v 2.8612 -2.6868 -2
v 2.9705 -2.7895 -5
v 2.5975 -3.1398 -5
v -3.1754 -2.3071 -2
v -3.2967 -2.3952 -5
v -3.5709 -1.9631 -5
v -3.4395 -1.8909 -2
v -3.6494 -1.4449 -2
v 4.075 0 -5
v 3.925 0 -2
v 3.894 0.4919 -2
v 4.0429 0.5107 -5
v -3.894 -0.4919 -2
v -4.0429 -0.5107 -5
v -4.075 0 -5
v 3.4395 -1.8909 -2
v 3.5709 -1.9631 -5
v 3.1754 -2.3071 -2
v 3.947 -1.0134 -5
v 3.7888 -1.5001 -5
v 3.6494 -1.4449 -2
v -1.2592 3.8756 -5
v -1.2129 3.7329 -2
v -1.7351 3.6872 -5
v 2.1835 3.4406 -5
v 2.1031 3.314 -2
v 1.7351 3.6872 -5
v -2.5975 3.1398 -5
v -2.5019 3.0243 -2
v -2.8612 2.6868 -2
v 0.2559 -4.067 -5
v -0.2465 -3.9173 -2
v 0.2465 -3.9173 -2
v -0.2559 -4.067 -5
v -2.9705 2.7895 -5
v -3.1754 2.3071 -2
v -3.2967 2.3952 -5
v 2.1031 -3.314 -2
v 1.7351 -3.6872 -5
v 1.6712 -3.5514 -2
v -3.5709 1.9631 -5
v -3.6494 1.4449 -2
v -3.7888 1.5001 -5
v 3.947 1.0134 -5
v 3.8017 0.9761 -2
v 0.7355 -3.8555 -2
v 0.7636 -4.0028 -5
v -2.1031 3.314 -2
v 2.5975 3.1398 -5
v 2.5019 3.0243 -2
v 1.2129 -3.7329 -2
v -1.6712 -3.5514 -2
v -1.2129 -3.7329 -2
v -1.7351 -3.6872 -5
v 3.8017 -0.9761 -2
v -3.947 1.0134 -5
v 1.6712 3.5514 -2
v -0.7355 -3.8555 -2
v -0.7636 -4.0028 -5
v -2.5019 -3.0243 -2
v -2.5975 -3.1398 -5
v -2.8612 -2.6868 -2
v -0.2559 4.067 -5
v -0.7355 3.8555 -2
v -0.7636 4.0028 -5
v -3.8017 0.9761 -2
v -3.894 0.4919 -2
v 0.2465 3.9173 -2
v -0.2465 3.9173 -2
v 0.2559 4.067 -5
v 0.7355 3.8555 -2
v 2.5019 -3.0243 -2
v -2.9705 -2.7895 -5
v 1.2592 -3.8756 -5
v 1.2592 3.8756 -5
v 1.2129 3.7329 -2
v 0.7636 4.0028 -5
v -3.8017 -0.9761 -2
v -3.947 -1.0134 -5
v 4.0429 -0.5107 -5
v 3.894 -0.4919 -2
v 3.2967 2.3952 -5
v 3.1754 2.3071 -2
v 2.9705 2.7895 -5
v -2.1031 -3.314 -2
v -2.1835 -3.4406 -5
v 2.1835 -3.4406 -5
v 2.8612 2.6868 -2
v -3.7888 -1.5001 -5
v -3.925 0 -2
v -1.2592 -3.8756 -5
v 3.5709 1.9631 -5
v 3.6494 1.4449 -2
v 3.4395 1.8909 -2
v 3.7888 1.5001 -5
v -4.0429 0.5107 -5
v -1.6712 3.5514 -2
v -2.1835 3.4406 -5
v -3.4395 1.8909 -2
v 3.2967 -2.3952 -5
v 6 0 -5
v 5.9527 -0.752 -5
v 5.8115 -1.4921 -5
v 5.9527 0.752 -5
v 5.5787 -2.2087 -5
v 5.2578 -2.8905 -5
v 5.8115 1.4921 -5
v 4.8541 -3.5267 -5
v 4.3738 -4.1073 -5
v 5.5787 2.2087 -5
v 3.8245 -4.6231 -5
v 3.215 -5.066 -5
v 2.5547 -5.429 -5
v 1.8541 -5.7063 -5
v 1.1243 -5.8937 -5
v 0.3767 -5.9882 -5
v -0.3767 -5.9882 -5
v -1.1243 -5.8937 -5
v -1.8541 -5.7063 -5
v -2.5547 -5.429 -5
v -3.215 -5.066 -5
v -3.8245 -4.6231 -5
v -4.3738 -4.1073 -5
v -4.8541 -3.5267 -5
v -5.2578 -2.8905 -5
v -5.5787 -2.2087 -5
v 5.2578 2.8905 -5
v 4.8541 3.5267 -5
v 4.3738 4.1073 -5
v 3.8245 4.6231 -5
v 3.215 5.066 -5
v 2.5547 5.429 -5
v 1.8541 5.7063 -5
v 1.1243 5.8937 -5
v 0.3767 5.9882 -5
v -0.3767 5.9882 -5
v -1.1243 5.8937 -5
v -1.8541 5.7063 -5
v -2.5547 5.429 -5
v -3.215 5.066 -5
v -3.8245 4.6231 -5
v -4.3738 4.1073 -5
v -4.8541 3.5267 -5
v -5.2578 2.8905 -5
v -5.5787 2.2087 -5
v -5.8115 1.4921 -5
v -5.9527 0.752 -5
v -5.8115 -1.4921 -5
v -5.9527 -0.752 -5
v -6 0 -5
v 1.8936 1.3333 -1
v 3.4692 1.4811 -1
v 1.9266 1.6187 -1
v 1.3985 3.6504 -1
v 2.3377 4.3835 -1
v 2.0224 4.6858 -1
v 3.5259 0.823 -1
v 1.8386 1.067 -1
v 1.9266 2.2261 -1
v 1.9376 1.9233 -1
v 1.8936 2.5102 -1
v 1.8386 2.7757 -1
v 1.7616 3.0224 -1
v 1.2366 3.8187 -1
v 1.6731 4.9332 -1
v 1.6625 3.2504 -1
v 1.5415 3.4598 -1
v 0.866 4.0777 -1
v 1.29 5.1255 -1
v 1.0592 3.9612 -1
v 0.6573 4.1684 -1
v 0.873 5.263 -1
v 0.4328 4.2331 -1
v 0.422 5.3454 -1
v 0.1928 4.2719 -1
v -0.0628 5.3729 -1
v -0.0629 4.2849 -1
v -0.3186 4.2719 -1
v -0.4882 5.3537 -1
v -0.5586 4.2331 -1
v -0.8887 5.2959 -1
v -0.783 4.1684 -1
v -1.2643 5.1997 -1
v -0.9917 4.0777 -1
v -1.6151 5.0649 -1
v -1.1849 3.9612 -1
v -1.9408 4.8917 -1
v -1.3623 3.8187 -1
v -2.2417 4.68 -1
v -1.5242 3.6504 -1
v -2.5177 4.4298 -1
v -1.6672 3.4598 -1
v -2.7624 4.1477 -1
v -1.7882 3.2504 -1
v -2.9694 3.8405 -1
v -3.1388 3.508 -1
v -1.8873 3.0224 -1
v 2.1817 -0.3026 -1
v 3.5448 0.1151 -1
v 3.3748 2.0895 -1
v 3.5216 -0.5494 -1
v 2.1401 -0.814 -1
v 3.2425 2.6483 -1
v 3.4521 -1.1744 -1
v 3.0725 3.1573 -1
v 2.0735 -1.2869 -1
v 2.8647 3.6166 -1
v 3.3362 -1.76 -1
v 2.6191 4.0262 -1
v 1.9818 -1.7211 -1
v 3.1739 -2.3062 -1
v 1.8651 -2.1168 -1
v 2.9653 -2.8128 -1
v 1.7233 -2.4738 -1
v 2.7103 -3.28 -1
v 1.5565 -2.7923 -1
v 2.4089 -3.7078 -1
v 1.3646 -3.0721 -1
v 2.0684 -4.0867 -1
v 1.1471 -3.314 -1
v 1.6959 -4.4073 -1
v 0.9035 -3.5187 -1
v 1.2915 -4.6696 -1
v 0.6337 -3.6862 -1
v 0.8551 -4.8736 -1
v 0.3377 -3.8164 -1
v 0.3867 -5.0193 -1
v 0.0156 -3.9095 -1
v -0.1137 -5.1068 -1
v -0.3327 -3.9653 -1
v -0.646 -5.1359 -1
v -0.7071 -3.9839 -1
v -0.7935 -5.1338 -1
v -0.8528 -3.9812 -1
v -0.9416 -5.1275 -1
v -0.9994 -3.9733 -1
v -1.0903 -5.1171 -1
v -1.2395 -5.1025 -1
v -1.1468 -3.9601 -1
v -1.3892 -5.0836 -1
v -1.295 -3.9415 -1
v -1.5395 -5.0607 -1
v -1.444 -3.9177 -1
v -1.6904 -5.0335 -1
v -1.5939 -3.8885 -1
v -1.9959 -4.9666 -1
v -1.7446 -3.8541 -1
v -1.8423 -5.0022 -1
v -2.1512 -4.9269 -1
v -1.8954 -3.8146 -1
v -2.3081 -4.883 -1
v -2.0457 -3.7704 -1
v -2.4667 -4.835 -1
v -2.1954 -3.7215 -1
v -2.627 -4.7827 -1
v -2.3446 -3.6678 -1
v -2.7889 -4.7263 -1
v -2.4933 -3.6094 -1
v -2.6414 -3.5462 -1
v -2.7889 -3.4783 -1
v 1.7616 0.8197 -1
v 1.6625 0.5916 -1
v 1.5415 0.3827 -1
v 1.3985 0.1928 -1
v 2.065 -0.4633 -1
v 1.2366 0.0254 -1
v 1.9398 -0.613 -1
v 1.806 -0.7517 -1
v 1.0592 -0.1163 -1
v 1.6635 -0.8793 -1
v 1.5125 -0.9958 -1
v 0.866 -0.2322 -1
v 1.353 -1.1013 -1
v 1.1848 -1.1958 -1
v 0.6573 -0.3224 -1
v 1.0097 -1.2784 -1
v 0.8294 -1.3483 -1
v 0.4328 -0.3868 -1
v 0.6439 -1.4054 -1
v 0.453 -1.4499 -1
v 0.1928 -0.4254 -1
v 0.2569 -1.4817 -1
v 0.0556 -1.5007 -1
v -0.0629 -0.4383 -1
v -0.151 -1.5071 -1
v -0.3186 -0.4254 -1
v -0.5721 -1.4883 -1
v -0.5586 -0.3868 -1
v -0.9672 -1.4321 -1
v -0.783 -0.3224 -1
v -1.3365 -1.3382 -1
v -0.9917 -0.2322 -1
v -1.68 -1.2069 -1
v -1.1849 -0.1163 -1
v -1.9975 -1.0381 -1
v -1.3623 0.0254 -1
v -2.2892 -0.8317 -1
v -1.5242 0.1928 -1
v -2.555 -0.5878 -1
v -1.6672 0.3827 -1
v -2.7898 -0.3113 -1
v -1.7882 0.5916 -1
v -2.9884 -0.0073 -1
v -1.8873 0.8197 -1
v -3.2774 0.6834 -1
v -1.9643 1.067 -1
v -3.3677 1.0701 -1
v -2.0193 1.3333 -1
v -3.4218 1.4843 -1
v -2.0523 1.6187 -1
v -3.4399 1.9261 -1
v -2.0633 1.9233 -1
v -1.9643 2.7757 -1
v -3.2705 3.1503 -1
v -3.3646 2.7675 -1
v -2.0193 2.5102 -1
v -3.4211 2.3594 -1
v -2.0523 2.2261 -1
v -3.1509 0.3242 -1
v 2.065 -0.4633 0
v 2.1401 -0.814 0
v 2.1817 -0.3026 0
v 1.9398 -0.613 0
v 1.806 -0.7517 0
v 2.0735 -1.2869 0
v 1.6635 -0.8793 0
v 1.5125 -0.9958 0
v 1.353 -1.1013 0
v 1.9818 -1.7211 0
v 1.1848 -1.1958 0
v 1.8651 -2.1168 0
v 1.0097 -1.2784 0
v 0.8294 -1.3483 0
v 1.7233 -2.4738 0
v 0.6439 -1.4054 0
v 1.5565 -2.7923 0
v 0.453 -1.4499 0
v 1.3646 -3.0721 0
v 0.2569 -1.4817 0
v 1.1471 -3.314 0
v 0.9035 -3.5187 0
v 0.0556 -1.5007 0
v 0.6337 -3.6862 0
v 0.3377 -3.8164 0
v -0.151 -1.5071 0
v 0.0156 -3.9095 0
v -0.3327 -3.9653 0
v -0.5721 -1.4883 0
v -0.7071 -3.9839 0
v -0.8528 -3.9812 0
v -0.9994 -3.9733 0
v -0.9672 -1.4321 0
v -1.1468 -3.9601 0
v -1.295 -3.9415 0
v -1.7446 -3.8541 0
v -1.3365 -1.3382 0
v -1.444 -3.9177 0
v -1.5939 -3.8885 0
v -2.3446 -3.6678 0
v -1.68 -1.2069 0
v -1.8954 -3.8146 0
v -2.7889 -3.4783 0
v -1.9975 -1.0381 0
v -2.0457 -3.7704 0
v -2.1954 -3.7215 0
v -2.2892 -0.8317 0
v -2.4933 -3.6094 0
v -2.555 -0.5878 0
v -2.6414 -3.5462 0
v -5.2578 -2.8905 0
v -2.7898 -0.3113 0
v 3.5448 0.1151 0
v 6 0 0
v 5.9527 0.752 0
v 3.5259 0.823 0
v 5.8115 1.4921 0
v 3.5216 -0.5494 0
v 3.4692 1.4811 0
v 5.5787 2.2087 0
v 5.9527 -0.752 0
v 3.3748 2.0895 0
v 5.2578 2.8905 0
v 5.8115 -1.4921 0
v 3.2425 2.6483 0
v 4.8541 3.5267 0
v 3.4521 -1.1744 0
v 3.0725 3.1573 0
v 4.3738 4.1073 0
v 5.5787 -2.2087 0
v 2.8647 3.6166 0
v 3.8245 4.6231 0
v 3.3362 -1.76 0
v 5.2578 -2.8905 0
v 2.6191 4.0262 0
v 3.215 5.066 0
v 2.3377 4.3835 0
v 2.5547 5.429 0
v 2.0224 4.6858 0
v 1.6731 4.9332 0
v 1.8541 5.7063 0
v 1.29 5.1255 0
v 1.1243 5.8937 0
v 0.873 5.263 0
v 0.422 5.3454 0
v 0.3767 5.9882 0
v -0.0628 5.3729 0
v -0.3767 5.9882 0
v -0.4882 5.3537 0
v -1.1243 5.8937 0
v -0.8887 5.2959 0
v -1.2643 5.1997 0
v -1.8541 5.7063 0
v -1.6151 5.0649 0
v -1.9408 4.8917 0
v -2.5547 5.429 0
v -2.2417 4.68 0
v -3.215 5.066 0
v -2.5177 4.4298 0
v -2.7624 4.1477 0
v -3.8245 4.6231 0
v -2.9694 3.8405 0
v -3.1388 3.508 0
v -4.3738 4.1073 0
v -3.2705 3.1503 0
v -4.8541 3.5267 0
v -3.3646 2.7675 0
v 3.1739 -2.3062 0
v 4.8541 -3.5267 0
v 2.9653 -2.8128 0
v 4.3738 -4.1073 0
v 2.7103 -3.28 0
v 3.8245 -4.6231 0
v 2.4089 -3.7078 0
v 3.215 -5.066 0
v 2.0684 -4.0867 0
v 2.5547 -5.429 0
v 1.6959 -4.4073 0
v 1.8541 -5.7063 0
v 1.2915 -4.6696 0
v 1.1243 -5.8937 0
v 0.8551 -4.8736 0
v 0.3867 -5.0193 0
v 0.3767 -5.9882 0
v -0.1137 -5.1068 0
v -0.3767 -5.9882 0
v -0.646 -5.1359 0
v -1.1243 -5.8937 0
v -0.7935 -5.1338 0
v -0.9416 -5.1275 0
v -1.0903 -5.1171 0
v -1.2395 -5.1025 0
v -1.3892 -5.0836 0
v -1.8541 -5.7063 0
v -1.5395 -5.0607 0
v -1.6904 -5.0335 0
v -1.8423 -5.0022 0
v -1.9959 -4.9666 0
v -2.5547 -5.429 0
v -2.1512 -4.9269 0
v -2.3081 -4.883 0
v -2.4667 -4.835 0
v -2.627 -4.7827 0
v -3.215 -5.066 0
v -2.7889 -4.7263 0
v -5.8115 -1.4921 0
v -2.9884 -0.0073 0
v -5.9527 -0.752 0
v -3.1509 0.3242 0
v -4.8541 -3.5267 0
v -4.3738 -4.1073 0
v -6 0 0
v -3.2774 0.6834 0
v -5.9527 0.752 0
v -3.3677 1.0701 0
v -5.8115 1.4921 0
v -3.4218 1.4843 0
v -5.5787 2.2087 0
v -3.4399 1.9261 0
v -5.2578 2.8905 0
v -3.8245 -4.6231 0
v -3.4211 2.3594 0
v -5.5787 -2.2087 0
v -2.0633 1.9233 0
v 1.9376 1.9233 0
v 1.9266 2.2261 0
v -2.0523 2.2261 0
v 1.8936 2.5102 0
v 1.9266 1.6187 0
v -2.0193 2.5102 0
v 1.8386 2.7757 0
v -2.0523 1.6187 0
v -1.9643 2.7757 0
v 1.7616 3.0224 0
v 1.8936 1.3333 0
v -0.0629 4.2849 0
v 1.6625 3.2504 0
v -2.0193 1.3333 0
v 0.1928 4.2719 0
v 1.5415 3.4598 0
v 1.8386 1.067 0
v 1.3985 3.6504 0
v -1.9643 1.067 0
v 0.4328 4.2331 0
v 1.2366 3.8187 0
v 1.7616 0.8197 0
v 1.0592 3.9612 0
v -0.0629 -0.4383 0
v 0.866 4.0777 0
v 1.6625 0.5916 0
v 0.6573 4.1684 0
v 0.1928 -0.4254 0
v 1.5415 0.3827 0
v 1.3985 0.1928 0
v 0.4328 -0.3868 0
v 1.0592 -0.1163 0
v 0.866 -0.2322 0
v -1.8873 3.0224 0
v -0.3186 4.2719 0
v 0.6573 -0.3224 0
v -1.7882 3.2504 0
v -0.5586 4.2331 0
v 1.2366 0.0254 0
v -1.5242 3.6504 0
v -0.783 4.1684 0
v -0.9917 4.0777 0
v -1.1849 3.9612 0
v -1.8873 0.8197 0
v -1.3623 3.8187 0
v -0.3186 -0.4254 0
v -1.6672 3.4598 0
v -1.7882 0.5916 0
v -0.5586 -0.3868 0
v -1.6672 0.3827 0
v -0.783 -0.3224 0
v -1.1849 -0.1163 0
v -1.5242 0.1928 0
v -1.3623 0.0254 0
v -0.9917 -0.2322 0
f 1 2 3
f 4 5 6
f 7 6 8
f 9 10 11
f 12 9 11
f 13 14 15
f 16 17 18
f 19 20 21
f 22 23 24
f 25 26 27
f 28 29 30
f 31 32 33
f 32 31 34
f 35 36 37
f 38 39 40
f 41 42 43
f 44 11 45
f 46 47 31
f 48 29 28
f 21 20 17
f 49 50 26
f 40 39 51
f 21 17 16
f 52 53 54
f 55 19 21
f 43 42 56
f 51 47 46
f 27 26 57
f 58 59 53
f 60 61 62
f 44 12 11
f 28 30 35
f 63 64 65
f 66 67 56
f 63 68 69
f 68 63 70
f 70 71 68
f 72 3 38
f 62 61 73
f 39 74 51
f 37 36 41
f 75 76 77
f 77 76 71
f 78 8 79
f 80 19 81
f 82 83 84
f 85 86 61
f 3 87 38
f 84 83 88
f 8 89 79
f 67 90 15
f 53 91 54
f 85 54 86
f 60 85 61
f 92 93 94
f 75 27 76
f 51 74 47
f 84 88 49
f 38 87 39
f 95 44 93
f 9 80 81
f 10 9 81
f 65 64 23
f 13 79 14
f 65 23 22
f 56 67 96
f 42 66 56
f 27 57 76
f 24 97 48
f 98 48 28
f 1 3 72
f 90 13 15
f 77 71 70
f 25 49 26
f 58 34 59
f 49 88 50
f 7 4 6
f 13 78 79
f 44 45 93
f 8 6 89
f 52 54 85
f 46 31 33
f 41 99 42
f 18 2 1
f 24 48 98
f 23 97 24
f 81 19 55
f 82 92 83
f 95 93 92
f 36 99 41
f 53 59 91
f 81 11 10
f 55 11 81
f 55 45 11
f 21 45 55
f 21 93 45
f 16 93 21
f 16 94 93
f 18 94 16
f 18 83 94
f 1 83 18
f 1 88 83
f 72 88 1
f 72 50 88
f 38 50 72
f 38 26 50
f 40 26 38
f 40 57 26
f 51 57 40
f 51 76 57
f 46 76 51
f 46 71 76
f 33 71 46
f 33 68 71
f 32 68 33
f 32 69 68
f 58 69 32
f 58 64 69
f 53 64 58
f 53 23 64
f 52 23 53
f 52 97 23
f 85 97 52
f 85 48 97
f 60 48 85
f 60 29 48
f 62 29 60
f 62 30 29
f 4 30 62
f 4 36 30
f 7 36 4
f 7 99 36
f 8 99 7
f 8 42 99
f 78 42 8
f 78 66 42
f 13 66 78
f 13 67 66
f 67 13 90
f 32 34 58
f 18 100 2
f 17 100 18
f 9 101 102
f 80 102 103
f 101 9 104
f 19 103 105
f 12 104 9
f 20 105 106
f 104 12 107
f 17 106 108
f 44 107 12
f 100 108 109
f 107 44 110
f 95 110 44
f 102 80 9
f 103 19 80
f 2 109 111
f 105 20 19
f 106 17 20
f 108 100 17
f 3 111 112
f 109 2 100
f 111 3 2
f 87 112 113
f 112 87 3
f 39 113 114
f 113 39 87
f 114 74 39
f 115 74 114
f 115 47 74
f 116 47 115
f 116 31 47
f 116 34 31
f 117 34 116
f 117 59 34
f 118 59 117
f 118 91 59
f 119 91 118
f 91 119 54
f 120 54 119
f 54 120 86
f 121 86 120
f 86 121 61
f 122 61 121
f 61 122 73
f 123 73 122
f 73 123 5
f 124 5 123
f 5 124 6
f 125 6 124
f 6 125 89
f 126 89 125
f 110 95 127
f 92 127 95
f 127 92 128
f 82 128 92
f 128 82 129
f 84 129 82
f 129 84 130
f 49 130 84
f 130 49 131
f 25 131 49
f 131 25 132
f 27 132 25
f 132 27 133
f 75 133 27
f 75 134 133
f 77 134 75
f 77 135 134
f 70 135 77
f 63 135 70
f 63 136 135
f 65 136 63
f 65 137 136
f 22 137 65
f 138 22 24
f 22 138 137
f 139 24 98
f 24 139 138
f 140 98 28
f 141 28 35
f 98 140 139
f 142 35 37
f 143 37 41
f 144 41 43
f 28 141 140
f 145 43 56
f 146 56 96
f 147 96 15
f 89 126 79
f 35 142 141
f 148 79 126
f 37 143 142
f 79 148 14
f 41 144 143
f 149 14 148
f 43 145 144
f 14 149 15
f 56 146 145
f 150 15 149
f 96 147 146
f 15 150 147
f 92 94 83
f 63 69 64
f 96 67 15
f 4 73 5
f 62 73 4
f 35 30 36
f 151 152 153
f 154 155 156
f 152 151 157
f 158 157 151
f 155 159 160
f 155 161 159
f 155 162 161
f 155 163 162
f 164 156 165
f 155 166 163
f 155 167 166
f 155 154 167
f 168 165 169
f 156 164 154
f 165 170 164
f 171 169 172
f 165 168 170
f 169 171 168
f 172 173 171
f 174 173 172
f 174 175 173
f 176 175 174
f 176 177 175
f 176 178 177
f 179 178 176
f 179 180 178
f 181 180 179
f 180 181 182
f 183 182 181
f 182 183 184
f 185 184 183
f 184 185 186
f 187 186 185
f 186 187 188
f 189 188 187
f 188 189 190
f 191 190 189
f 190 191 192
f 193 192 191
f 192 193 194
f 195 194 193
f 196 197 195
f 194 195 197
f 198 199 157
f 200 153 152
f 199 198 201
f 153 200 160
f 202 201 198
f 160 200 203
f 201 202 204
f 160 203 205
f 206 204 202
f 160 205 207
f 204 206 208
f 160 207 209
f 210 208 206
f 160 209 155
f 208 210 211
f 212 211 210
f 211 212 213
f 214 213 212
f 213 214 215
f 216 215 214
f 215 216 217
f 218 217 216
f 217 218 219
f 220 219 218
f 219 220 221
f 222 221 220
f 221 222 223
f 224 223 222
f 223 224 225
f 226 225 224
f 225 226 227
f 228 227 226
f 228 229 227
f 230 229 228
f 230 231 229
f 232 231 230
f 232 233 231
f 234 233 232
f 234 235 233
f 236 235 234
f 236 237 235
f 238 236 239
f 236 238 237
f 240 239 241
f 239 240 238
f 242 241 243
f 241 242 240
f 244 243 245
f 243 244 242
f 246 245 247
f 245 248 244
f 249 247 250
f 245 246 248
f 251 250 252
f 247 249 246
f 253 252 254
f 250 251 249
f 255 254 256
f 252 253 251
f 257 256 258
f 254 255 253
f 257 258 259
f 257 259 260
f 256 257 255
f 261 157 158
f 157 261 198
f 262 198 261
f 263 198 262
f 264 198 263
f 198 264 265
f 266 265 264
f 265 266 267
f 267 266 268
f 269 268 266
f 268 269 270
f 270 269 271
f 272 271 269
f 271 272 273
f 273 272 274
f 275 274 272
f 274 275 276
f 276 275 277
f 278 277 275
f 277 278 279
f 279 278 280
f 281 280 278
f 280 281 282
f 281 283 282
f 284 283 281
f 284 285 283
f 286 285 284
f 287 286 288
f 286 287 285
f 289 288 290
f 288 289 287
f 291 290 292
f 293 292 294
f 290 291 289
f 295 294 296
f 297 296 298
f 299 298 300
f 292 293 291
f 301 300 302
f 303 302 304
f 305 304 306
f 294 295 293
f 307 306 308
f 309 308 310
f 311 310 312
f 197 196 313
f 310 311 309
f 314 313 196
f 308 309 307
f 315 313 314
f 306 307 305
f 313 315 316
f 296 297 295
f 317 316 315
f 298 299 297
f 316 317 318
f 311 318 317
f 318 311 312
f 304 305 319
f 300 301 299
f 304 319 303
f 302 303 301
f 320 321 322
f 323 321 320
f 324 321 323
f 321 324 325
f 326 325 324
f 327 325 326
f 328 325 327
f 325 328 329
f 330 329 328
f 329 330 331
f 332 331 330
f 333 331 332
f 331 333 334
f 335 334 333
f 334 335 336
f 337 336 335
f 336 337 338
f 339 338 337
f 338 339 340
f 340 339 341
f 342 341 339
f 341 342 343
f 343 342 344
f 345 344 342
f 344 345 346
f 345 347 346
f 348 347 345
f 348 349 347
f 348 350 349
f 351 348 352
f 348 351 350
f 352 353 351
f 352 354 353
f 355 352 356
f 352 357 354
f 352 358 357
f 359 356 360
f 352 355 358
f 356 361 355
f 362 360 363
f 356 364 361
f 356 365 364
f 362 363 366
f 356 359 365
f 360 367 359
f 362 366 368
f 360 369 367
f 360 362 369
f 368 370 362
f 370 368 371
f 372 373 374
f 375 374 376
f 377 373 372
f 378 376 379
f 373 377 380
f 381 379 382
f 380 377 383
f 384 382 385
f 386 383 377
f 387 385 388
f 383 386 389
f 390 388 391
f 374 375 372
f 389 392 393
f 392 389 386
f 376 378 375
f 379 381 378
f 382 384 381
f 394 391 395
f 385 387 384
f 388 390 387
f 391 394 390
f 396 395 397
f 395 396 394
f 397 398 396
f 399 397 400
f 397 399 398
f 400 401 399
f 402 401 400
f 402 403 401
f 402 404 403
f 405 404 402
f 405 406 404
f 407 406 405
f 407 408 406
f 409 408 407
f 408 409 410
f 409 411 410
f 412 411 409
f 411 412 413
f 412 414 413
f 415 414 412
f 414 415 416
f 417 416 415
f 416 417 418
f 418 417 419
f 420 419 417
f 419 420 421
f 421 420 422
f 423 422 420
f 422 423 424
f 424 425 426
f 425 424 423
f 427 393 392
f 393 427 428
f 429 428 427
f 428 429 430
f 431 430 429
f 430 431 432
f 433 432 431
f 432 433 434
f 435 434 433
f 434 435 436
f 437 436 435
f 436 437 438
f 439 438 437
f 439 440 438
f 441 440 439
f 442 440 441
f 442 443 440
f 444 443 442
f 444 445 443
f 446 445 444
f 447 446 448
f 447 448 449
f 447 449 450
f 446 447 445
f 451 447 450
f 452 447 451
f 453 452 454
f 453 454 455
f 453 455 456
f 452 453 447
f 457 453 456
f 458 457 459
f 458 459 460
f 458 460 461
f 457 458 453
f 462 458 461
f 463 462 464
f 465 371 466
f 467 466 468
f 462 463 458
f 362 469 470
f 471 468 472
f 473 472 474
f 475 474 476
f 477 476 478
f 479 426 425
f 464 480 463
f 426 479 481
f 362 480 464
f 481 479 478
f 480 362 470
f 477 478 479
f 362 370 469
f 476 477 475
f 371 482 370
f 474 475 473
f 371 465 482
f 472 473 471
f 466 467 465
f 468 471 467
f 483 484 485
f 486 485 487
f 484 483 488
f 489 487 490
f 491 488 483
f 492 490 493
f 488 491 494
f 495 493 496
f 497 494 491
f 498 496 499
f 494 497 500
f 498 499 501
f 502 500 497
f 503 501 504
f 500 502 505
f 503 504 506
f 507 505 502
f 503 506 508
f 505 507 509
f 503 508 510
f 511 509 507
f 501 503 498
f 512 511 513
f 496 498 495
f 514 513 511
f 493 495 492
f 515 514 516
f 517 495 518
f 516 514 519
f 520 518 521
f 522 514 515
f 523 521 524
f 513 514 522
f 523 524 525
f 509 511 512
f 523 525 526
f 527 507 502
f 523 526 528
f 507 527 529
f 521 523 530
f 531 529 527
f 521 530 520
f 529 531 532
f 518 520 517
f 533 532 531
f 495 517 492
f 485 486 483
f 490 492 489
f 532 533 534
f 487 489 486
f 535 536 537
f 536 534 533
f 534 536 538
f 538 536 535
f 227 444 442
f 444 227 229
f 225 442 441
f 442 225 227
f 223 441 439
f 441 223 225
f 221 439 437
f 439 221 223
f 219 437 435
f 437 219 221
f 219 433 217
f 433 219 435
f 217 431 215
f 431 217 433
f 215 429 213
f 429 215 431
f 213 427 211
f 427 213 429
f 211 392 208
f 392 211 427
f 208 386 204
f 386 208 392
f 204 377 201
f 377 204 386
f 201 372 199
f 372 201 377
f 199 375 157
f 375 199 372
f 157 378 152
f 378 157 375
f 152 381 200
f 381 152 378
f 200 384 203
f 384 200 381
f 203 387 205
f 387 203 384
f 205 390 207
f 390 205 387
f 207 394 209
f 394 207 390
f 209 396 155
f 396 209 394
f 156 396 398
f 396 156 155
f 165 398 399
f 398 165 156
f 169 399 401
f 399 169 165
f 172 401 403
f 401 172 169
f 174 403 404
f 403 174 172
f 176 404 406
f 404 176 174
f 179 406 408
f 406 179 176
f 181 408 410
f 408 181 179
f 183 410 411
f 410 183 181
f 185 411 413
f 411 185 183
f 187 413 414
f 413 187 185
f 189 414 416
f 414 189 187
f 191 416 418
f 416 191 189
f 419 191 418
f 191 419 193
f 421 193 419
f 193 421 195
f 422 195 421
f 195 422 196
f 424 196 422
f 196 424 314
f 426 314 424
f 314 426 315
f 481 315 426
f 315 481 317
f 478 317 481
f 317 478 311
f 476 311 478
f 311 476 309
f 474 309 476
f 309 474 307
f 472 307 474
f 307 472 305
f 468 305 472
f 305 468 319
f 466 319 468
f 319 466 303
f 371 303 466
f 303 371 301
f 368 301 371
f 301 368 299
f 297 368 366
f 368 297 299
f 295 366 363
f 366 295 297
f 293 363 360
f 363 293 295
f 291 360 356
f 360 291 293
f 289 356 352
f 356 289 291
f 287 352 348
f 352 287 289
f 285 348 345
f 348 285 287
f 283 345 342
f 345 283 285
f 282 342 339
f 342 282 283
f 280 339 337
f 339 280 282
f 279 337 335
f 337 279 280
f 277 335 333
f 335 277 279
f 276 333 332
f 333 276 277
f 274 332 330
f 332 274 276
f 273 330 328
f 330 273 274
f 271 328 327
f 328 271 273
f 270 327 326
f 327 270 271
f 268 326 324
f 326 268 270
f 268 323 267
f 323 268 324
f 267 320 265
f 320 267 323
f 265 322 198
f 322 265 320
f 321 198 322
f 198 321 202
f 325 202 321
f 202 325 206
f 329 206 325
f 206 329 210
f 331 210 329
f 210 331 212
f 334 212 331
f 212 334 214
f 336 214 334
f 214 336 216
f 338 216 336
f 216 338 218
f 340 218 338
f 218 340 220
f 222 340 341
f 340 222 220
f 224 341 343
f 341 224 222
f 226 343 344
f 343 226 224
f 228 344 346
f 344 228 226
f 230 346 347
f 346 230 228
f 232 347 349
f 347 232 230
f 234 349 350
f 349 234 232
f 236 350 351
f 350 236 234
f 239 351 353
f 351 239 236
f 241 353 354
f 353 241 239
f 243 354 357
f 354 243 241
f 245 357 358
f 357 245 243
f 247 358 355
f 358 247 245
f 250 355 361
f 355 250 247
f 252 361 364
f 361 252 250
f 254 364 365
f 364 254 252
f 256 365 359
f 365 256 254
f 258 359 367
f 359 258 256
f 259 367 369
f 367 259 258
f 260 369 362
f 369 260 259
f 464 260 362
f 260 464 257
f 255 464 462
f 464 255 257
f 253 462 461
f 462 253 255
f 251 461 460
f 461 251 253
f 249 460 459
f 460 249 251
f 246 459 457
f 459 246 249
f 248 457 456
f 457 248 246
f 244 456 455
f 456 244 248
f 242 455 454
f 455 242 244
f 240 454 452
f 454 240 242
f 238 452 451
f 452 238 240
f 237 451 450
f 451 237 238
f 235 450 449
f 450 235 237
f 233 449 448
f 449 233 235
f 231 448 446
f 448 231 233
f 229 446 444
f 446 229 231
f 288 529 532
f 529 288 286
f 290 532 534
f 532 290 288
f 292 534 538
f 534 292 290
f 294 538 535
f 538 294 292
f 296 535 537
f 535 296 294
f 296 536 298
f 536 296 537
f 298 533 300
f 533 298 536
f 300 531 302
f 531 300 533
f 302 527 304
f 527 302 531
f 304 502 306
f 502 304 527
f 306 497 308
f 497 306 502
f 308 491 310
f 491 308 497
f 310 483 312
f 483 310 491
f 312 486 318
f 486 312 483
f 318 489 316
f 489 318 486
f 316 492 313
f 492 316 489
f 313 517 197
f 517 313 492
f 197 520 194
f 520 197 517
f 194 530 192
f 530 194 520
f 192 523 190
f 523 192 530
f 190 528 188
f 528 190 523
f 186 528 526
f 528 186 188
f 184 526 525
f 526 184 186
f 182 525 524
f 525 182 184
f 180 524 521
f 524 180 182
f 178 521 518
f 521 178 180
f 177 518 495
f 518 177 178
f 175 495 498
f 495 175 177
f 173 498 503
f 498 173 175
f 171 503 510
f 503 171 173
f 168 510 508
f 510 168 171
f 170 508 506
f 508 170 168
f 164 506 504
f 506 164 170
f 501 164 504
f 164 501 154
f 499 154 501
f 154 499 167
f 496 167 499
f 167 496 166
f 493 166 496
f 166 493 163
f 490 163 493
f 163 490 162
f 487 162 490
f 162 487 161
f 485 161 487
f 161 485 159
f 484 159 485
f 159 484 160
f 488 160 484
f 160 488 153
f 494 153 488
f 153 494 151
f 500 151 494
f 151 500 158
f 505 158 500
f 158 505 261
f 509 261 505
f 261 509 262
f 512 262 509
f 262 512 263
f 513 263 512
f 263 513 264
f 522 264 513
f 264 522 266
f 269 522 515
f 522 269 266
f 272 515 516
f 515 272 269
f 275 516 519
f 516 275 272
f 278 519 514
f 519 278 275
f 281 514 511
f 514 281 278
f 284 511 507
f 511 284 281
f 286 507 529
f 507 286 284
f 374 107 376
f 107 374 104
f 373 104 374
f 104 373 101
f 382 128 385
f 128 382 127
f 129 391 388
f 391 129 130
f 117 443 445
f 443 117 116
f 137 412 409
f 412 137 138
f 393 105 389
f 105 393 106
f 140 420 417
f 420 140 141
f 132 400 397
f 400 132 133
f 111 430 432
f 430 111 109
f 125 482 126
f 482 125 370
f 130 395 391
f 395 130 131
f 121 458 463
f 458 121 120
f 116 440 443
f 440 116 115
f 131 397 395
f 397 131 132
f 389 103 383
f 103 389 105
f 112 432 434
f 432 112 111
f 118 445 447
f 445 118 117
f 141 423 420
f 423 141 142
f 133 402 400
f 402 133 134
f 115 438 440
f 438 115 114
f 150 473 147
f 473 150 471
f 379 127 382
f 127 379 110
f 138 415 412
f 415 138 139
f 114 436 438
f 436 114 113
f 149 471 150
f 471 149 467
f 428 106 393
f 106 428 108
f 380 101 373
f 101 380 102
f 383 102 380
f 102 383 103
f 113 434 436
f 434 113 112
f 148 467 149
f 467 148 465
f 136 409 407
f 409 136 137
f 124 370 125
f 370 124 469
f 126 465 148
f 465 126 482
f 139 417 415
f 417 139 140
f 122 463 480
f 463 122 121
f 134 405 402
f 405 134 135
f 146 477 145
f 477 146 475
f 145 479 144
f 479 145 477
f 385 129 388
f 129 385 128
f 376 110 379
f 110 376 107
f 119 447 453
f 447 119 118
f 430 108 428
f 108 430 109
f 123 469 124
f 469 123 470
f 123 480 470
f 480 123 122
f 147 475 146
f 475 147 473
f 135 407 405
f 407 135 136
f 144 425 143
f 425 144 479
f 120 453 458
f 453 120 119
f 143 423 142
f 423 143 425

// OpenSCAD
$fn = 50;

difference() {
	union() {
		translate(v = [0, 0, -5.0]) {
			cylinder(h = 5, r = 6.0);
		}
	}
	union() {
		#translate(v = [0, 0, -5.0]) {
			cylinder(h = 3, r1 = 4.075, r2 = 3.925);
		}
		translate(v = [0, 0, -1]) {
			linear_extrude(height = 1) {
				text(font = "Impact", halign = "center", size = 10, text = "9", valign = "center");
			}
		}
	}
}
